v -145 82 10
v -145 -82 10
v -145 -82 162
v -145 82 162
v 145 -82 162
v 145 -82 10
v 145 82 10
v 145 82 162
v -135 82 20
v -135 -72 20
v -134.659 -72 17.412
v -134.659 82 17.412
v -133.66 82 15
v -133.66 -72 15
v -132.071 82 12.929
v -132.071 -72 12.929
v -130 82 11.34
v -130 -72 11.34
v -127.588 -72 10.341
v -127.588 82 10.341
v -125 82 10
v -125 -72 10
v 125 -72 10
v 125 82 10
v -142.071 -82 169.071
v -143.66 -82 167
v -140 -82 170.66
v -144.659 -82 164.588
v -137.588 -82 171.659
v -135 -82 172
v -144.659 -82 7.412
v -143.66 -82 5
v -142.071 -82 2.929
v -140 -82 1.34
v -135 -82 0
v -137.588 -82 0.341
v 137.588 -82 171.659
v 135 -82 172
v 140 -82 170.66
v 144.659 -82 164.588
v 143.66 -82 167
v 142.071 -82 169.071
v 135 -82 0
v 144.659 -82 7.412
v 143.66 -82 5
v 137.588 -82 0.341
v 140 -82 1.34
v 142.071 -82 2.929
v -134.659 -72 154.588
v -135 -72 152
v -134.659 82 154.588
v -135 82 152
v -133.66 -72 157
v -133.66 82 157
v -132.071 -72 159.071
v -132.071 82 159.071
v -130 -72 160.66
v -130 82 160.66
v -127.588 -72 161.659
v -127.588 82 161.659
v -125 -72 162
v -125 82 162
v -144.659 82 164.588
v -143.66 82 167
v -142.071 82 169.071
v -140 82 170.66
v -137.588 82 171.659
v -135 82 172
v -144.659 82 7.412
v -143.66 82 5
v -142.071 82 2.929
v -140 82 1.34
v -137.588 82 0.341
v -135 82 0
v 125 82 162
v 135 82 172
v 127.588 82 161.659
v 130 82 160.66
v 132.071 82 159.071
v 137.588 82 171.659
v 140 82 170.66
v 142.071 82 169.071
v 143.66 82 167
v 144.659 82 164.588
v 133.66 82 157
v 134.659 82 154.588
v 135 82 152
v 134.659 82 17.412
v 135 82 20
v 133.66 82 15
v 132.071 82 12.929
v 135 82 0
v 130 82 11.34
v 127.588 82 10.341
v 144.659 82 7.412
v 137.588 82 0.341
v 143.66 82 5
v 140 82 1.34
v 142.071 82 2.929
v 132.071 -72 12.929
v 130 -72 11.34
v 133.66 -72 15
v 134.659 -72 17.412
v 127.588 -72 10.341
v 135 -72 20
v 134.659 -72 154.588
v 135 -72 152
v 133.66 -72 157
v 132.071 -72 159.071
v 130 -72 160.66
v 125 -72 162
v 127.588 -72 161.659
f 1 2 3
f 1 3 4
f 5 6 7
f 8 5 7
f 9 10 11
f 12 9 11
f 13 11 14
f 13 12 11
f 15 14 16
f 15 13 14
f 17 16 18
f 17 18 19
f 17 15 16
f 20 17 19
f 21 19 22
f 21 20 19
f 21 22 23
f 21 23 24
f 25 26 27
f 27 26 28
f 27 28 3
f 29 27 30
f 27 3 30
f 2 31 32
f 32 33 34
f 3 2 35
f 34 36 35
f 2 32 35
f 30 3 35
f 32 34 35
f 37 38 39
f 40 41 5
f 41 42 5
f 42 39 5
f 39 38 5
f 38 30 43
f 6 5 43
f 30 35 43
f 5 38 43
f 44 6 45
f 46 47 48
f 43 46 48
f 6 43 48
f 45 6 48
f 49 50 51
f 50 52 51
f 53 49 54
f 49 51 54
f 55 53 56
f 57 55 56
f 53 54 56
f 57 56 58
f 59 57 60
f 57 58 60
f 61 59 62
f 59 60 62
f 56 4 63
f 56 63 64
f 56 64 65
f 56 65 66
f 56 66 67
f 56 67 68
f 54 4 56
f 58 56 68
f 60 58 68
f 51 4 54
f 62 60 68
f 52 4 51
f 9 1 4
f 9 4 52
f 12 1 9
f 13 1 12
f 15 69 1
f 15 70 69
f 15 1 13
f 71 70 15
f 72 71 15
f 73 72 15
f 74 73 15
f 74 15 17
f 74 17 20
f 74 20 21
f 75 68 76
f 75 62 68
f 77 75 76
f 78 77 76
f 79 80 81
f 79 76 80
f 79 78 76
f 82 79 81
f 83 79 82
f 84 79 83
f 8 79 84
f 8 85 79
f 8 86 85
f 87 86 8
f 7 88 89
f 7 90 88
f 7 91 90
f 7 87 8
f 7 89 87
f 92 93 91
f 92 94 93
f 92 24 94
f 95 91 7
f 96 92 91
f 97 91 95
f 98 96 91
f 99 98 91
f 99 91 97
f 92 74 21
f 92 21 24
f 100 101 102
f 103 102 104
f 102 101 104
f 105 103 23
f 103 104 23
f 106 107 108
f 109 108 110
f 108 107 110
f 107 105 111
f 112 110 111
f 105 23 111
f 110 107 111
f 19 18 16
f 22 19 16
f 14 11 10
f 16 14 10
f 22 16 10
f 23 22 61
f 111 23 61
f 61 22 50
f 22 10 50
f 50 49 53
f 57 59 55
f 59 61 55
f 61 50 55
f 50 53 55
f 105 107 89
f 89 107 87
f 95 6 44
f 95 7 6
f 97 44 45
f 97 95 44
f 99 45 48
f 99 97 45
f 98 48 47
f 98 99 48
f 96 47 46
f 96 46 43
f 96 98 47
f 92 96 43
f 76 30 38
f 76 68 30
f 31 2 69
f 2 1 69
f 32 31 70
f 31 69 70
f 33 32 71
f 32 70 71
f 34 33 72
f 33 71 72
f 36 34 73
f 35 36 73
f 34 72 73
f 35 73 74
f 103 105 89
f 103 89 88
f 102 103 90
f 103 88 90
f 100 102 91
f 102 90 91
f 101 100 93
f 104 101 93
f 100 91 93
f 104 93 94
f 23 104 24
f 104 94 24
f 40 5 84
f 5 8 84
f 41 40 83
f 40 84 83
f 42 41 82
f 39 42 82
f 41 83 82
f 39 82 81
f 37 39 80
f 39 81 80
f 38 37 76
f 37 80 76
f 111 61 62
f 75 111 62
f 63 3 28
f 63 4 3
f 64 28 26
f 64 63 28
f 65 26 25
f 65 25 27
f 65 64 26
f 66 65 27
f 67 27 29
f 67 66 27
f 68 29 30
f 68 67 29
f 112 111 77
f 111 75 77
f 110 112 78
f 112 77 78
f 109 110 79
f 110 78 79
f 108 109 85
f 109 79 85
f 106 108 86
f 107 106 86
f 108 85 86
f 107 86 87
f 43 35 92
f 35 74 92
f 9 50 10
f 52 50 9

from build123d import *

# Parameters (mm, degrees)
CROQUIS1_W              = 290
CROQUIS1_H              = 164
SALIENTE_EXTRUIR1_DEPTH = 172
REDONDEO1_R             = 10
VACIADO1_START          = -135
VACIADO1_OUTLINE_W      = 154
VACIADO1_OUTLINE_H      = 152
VACIADO1_DEPTH          = 270
REDONDEO2_R             = 10


# Read off the part's stored shape, not the designer's step: Vaciado1
with BuildPart() as part:
    # Croquis1 → Saliente-Extruir1 (new body)
    with BuildSketch(Plane.XY):
        Rectangle(CROQUIS1_W, CROQUIS1_H)
    extrude(amount=SALIENTE_EXTRUIR1_DEPTH)

    # Redondeo1
    redondeo1_edges = [part.edges().sort_by_distance(p)[0] for p in [
        (-145, 0, 172),
        (145, 0, 172),
        (-145, 0, 0),
        (145, 0, 0),
    ]]
    fillet(redondeo1_edges, radius=REDONDEO1_R)

    # Vaciado1 outline → Vaciado1 (cut)
    with BuildSketch(Plane.YZ.offset(VACIADO1_START)):
        with Locations((5, 86)):
            Rectangle(VACIADO1_OUTLINE_W, VACIADO1_OUTLINE_H)
    extrude(amount=VACIADO1_DEPTH, mode=Mode.SUBTRACT)

    # Redondeo2
    redondeo2_edges = [part.edges().sort_by_distance(p)[0] for p in [
        (135, 5, 162),
        (-135, 5, 162),
        (-135, 5, 10),
        (135, 5, 10),
    ]]
    fillet(redondeo2_edges, radius=REDONDEO2_R)


solid = part.part
